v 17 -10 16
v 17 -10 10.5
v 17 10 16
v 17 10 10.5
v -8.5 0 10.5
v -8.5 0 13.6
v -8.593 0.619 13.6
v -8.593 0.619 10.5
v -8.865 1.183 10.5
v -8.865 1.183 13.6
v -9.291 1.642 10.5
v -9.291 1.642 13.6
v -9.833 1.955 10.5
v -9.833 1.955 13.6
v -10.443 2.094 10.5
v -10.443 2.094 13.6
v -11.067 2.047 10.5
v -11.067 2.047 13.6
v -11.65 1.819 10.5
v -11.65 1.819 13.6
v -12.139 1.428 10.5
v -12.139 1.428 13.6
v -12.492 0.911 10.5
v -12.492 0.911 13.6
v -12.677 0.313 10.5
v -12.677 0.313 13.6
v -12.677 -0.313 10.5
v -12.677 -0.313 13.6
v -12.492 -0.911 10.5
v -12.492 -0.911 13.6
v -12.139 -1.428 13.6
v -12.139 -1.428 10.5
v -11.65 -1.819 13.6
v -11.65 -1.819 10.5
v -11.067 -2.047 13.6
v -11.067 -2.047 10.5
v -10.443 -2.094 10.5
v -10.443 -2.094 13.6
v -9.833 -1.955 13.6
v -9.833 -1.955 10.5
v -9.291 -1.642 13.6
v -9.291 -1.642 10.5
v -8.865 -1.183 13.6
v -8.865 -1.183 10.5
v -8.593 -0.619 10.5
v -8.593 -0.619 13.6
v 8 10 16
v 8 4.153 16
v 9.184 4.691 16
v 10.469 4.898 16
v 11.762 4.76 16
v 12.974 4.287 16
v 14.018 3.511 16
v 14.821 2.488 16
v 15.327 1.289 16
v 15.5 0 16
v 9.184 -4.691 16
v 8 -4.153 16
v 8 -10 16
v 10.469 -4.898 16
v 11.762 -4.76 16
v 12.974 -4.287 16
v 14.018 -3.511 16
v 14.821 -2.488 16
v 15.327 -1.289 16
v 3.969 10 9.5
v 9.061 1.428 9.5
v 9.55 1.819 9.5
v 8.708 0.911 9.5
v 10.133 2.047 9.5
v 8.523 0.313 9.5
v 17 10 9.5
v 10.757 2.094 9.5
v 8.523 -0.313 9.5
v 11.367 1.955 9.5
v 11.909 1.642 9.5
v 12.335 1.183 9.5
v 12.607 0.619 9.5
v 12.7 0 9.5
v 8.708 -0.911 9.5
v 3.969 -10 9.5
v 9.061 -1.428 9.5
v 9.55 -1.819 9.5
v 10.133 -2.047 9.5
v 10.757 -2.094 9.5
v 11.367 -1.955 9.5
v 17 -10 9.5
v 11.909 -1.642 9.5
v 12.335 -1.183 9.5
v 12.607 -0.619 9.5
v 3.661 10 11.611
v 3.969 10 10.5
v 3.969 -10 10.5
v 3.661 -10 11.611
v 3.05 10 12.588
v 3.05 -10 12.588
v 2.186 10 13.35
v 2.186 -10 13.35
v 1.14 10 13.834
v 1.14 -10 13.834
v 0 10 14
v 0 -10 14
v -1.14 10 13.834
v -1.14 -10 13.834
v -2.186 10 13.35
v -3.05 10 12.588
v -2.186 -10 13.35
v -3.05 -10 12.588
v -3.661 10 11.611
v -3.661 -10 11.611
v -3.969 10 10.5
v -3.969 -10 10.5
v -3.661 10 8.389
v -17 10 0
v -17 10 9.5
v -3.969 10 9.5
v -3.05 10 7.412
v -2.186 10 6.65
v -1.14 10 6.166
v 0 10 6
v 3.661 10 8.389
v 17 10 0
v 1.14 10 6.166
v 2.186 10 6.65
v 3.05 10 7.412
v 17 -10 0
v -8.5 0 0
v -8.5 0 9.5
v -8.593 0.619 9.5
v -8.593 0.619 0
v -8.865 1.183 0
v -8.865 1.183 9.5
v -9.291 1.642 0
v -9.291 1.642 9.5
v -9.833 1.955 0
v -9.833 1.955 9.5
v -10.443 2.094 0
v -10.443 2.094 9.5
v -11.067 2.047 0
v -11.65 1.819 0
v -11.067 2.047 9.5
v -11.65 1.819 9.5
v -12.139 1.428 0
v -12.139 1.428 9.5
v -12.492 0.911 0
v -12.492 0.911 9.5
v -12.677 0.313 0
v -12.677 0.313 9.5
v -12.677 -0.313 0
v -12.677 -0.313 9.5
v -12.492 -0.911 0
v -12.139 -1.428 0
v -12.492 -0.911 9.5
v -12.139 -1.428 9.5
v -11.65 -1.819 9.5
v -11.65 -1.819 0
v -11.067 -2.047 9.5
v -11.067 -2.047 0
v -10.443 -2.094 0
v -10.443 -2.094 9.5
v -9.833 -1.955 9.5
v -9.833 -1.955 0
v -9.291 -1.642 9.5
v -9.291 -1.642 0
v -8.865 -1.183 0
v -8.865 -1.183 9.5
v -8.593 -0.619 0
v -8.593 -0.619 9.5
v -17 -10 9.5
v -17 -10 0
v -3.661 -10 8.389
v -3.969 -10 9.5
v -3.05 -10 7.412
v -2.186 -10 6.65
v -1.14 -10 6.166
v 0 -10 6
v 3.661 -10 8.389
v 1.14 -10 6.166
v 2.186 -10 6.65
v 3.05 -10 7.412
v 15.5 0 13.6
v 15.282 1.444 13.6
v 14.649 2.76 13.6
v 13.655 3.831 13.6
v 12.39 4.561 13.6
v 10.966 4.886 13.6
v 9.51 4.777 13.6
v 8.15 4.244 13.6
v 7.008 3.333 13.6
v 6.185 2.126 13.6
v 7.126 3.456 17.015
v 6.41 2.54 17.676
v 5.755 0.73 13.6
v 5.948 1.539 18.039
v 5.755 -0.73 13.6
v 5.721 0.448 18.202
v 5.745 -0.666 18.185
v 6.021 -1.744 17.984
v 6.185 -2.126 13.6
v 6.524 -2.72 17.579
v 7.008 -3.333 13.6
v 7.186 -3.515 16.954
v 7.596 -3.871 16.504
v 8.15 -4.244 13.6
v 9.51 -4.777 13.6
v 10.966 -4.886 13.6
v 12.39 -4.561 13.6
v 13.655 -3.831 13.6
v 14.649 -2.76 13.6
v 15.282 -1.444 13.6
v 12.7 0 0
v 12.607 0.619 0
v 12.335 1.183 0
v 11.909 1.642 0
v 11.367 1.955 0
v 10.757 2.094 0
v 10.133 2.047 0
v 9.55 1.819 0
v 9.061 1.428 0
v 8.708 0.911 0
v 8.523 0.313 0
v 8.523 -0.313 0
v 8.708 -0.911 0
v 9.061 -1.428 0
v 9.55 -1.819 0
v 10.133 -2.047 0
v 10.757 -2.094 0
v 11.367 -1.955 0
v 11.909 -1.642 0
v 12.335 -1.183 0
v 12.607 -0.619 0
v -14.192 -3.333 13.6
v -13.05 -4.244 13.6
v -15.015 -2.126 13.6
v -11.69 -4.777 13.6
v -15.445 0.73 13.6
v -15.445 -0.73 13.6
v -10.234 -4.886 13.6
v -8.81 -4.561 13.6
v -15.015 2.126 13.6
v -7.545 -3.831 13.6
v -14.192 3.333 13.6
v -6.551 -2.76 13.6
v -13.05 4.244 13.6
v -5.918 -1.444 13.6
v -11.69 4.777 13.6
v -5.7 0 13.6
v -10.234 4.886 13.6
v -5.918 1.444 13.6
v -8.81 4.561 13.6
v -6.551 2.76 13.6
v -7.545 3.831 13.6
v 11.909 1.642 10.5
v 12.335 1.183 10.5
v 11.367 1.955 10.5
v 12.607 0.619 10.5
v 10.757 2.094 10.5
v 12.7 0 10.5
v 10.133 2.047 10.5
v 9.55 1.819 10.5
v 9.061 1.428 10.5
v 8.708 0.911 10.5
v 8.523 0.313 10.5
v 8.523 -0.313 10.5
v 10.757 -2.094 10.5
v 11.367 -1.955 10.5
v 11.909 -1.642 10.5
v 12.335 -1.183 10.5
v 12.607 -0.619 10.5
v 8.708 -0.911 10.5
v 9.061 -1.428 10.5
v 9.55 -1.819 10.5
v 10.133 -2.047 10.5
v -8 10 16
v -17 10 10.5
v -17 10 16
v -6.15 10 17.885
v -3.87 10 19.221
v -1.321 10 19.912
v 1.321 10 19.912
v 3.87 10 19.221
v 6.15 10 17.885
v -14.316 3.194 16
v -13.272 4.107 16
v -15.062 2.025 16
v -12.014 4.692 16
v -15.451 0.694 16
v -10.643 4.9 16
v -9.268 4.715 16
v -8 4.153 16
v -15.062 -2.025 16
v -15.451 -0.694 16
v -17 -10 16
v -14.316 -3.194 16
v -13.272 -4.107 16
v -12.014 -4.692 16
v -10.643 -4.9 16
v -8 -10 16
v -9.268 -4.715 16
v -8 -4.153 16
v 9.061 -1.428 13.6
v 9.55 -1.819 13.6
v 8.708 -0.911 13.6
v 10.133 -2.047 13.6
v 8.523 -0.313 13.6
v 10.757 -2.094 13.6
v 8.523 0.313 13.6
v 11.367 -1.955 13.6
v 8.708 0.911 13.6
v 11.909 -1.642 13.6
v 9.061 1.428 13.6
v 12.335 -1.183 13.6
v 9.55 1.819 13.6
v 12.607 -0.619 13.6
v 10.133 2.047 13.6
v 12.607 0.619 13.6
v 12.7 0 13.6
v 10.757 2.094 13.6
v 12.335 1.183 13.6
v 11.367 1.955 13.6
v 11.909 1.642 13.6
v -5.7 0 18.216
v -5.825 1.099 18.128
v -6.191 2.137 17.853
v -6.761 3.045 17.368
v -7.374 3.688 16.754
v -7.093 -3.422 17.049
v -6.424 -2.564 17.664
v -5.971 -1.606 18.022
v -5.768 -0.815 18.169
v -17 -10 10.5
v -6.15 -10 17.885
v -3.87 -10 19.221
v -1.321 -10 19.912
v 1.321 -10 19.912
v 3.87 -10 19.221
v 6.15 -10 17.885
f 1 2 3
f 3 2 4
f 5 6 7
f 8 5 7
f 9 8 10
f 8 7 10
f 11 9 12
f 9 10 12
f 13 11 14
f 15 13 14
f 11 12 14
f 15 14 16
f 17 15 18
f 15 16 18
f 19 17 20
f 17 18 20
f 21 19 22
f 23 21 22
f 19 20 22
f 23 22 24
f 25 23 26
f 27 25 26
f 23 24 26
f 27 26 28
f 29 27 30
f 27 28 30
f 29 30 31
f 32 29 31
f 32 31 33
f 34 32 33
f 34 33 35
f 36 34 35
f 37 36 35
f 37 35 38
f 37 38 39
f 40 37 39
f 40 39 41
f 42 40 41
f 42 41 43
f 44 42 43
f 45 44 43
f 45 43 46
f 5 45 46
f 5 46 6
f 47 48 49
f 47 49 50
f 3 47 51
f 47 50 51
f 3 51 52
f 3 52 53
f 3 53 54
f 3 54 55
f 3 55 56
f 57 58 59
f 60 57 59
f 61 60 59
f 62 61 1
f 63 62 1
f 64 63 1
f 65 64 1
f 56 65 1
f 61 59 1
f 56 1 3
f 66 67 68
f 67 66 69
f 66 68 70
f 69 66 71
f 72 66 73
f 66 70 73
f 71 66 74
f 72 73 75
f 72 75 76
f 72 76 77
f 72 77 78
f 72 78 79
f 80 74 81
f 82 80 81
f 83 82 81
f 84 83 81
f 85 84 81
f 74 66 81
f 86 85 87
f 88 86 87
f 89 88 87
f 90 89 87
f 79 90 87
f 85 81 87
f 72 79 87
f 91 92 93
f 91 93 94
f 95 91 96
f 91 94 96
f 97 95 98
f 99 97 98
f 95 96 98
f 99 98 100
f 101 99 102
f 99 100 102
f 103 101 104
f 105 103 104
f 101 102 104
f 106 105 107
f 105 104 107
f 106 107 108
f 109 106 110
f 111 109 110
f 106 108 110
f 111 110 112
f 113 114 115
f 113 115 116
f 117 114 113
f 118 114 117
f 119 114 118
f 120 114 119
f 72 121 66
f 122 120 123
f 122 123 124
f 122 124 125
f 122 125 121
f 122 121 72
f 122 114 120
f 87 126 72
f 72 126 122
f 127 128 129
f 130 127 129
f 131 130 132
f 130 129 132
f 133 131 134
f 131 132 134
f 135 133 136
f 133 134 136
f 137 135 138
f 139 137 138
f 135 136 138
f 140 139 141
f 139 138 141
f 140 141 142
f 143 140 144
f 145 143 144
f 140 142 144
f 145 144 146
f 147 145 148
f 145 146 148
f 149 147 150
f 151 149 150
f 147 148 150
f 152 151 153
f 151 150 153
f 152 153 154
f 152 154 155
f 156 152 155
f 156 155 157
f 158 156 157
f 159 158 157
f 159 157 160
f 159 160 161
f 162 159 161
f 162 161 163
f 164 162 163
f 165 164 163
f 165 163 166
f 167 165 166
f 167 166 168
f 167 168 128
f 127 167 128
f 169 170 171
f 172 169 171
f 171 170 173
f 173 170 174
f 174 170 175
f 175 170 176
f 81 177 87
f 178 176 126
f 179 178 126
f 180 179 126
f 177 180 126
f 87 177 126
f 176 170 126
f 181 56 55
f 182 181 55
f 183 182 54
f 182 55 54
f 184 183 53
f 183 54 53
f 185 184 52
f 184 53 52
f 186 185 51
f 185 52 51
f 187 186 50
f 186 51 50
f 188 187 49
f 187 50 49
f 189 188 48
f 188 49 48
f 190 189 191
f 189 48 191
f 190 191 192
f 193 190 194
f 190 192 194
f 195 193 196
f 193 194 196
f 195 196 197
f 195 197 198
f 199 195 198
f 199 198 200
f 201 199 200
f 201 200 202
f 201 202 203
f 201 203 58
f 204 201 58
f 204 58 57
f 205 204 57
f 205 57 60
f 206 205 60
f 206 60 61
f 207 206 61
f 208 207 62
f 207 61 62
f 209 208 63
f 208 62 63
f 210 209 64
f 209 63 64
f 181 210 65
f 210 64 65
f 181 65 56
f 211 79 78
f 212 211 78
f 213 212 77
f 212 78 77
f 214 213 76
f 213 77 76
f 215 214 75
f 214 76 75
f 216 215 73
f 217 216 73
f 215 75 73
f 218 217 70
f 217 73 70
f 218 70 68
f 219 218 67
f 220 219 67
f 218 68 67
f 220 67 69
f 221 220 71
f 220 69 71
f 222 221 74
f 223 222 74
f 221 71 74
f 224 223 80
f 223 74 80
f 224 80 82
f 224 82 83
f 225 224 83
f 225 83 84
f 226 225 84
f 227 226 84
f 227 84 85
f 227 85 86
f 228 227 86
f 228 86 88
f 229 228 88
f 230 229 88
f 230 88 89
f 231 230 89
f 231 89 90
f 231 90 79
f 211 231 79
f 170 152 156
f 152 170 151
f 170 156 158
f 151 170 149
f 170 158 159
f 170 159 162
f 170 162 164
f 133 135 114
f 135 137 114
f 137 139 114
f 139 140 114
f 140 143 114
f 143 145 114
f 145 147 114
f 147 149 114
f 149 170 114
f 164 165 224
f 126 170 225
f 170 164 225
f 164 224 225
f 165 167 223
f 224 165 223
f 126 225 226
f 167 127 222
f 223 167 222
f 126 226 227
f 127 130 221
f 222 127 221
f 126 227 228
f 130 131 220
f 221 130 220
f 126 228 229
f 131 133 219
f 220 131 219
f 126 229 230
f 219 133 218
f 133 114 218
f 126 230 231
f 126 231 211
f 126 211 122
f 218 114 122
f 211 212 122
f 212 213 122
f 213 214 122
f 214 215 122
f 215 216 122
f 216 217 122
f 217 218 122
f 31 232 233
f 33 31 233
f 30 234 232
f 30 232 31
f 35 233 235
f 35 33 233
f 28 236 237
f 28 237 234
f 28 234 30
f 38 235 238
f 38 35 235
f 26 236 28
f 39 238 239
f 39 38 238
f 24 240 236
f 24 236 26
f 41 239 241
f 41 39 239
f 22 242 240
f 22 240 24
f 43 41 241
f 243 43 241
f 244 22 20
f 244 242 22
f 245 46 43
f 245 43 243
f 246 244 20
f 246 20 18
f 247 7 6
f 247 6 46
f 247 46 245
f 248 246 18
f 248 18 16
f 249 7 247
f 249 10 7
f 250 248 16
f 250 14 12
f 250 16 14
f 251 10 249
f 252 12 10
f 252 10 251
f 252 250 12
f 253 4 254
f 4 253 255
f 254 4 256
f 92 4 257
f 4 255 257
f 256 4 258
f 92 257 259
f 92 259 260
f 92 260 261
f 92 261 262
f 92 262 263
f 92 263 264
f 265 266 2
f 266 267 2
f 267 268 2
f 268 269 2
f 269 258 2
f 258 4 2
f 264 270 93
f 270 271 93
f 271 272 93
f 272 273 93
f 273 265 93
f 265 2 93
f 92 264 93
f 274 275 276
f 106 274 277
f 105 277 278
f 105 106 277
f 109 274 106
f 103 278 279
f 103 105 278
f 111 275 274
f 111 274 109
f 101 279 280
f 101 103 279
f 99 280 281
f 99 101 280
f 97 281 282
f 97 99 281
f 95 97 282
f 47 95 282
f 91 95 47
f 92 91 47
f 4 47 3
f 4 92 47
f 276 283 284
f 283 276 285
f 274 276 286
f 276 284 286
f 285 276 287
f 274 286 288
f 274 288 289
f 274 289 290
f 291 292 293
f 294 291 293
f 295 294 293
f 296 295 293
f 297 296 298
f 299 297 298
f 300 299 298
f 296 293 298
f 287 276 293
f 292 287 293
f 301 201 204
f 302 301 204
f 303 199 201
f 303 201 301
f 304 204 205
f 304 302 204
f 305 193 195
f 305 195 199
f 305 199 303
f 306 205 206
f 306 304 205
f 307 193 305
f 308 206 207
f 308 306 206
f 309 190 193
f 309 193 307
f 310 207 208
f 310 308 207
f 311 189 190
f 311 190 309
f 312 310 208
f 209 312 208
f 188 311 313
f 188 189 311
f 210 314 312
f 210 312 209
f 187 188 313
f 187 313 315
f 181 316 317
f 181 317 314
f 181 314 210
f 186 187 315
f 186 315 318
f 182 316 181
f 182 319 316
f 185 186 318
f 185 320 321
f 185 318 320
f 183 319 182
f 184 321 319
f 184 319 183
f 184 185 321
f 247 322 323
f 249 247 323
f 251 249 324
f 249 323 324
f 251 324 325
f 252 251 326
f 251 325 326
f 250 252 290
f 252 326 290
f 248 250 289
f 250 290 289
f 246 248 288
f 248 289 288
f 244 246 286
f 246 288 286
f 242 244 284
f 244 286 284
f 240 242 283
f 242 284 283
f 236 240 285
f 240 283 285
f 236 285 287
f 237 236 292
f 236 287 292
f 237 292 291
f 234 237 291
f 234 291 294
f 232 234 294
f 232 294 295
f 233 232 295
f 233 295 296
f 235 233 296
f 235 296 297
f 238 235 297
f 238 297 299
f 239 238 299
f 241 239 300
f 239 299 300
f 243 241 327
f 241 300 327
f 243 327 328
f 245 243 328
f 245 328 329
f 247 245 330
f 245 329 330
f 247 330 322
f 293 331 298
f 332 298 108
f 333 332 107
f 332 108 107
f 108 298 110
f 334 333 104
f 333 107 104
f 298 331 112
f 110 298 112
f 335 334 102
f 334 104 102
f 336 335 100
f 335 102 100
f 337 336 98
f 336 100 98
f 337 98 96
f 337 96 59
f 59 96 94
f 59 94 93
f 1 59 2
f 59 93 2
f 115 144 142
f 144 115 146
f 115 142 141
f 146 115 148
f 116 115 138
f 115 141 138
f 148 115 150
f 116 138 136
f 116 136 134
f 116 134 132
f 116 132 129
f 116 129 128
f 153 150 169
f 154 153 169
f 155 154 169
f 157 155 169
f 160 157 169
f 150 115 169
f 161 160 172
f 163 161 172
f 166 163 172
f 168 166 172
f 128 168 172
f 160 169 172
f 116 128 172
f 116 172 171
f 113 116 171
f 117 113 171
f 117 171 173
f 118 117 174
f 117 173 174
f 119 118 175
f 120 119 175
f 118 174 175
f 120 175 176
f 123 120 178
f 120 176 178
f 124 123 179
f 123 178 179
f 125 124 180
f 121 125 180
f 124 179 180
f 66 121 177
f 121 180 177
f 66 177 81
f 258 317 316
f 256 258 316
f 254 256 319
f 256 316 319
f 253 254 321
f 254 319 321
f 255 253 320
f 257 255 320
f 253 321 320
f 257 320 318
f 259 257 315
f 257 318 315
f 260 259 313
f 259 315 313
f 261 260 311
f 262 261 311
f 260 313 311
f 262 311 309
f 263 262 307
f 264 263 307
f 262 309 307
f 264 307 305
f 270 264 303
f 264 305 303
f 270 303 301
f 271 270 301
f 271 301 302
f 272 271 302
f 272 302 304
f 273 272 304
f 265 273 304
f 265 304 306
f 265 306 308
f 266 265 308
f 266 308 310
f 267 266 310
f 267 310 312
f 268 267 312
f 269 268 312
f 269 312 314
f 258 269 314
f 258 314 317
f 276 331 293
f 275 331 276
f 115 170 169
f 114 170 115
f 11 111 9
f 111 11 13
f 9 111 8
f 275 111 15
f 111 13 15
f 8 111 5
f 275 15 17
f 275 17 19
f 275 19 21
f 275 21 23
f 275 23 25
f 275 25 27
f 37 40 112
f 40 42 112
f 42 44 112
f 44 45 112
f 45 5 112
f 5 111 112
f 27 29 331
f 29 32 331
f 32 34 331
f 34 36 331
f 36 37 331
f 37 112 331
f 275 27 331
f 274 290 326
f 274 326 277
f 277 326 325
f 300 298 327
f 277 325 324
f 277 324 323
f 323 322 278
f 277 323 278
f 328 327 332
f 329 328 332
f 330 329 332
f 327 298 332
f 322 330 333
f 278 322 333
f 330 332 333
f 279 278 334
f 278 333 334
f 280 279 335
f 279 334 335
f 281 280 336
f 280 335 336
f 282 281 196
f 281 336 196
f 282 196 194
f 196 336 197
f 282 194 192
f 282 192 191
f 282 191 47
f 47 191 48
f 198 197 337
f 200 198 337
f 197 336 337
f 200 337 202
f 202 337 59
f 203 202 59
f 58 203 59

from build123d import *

# Parameters (mm, degrees)
F0_W     = 34
F0_H     = 20
F1_DEPTH = 20
F2_R     = 4
F3_DEPTH = 20
F4_R     = 4.9
F4_R_2   = 2.1
F5_DEPTH = 6.4
F6_DEPTH = 20
F8_DEPTH = 20


with BuildPart() as f1:
    # F0 (on Top) → F1 (new body)
    with BuildSketch(Plane.XY):
        Rectangle(F0_W, F0_H)
    extrude(amount=F1_DEPTH)

    # F2 (on face) → F3 (cut, through all)
    with BuildSketch(Plane.XZ.offset(10)):
        with Locations((0, 10)):
            Circle(F2_R)
    extrude(amount=-F3_DEPTH, mode=Mode.SUBTRACT)

    # F4 (on face) → F5 (cut)
    with BuildSketch(Plane.XY.offset(20)):
        with Locations((-10.6, 0)):
            Circle(F4_R)
        with Locations((-10.6, 0)):
            Circle(F4_R_2, mode=Mode.SUBTRACT)
        with Locations((10.6, 0)):
            Circle(F4_R)
        with Locations((10.6, 0)):
            Circle(F4_R_2, mode=Mode.SUBTRACT)
    extrude(amount=-F5_DEPTH, mode=Mode.SUBTRACT)

    # F4 (on face) → F6 (cut, through all)
    with BuildSketch(Plane.XY.offset(20)):
        with Locations((-10.6, 0)):
            Circle(F4_R_2)
        with Locations((10.6, 0)):
            Circle(F4_R_2)
    extrude(amount=-F6_DEPTH, mode=Mode.SUBTRACT)

    # F7 (on face) → F8 (cut, through all)
    with BuildSketch(Plane.XZ.offset(10)):
        with BuildLine():
            ThreePointArc((-8, 16), (-4.472135955, 18.94427191), (0, 20))
            Line((0, 20), (-17, 20))
            Line((-17, 20), (-17, 16))
            Line((-17, 16), (-8, 16))
        make_face()
        with BuildLine():
            ThreePointArc((0, 20), (4.472135955, 18.94427191), (8, 16))
            Line((8, 16), (17, 16))
            Line((17, 16), (17, 20))
            Line((17, 20), (0, 20))
        make_face()
        with BuildLine():
            ThreePointArc((9.9874921777, 9.5), (9.9968725554, 9.7499217894), (10, 10))
            ThreePointArc((10, 10), (9.9968725554, 10.2500782106), (9.9874921777, 10.5))
            Line((9.9874921777, 10.5), (3.9686269666, 10.5))
            ThreePointArc((3.9686269666, 10.5), (3.9921490369, 10.2504916502), (4, 10))
            ThreePointArc((4, 10), (3.9921490369, 9.7495083498), (3.9686269666, 9.5))
            Line((3.9686269666, 9.5), (9.9874921777, 9.5))
        make_face()
        with BuildLine():
            ThreePointArc((9.9874921777, 10.5), (9.9968725554, 10.2500782106), (10, 10))
            ThreePointArc((10, 10), (9.9968725554, 9.7499217894), (9.9874921777, 9.5))
            Line((9.9874921777, 9.5), (17, 9.5))
            Line((17, 9.5), (17, 10.5))
            Line((17, 10.5), (9.9874921777, 10.5))
        make_face()
        with BuildLine():
            ThreePointArc((-3.9686269666, 9.5), (-4, 10), (-3.9686269666, 10.5))
            Line((-3.9686269666, 10.5), (-9.9874921777, 10.5))
            ThreePointArc((-9.9874921777, 10.5), (-10, 10), (-9.9874921777, 9.5))
            Line((-9.9874921777, 9.5), (-3.9686269666, 9.5))
        make_face()
        with BuildLine():
            Line((-17, 9.5), (-9.9874921777, 9.5))
            ThreePointArc((-9.9874921777, 9.5), (-10, 10), (-9.9874921777, 10.5))
            Line((-9.9874921777, 10.5), (-17, 10.5))
            Line((-17, 10.5), (-17, 9.5))
        make_face()
    extrude(amount=-F8_DEPTH, mode=Mode.SUBTRACT)


solid = f1.part
